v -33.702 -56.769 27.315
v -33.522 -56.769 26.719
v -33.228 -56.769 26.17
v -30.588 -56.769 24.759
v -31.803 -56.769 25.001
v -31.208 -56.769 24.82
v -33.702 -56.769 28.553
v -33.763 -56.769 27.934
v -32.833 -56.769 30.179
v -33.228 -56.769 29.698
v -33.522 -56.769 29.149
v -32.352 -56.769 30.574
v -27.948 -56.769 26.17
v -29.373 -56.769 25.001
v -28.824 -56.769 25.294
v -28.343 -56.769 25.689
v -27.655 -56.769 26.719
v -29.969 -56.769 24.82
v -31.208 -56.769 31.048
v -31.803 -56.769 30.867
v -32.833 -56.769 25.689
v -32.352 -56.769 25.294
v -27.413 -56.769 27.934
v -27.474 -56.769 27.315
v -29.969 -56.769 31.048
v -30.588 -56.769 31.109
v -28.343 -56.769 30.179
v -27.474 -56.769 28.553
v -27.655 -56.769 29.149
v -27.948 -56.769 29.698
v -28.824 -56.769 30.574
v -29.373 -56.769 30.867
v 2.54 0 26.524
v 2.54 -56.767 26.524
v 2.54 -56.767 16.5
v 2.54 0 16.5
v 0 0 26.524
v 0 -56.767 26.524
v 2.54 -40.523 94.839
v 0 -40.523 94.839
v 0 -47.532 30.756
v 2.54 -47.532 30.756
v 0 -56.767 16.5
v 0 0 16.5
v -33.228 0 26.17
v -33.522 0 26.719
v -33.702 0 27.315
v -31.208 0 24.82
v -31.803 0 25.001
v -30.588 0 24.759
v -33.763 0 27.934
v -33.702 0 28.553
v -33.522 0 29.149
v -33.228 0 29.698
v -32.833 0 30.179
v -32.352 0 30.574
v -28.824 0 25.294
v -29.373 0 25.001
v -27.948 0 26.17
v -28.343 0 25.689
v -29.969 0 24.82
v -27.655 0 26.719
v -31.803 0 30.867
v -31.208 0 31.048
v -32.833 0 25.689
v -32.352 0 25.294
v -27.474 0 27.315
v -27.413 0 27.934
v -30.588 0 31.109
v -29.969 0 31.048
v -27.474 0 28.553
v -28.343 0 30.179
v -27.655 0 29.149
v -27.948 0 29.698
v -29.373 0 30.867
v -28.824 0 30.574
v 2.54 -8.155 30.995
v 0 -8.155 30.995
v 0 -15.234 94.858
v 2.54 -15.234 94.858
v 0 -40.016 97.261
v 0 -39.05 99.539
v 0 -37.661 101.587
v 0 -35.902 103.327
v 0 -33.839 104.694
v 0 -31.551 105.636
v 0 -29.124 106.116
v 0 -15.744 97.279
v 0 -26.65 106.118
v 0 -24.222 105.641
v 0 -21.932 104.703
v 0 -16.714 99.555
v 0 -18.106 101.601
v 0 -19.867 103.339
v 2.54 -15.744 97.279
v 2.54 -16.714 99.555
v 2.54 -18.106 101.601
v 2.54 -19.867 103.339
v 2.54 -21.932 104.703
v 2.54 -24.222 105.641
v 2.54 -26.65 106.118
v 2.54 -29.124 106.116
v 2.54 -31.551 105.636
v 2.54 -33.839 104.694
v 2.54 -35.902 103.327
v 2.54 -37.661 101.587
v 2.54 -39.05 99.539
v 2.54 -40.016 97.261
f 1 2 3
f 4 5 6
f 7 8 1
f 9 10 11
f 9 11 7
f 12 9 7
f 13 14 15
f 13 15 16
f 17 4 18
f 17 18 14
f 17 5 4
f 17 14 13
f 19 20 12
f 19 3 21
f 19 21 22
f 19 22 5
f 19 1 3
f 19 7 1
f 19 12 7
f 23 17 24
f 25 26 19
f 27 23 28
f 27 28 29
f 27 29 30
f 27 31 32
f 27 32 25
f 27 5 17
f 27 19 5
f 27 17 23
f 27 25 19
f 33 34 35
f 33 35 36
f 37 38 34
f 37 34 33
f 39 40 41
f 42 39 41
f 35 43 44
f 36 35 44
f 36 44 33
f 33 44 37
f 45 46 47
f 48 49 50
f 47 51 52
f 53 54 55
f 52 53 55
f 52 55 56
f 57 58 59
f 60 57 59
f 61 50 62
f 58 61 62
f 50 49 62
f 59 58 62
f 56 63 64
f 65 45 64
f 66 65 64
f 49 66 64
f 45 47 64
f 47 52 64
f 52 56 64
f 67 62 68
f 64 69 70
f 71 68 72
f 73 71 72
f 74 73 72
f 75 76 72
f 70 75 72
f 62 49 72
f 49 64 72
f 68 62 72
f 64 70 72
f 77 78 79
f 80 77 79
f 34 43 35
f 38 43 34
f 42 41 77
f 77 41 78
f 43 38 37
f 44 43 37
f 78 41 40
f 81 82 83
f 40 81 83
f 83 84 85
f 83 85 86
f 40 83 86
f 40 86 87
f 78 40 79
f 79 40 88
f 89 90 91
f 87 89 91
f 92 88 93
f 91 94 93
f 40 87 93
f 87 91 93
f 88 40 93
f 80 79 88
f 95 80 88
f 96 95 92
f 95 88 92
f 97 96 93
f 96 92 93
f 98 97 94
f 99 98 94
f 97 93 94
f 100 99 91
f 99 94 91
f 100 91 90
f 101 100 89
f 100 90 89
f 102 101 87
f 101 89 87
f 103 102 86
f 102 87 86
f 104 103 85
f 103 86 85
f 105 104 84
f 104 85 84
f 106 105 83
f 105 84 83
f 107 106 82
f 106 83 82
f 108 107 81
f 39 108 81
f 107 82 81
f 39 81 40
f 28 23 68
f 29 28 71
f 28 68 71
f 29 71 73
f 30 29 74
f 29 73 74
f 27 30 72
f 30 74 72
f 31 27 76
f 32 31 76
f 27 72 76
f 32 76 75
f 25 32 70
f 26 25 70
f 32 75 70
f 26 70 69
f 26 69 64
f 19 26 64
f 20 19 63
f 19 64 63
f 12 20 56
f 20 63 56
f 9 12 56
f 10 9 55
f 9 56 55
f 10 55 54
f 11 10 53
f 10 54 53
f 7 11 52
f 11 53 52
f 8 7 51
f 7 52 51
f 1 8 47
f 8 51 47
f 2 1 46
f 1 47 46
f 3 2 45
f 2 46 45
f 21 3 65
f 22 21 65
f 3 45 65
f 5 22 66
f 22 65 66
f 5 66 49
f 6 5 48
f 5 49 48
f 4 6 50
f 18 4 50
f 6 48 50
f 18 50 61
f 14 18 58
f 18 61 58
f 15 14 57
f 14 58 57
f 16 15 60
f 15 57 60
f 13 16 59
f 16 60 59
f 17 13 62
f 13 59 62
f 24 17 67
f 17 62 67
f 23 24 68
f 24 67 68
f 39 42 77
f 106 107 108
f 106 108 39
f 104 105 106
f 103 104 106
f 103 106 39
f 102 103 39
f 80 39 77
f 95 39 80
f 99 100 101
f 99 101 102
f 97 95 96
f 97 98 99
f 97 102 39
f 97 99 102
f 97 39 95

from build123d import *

# Parameters (mm, degrees)
F0_R     = 3.175
F1_DEPTH = 56.769
F2_W     = 56.7667558789
F2_H     = 10.0242104381
F3_DEPTH = 2.54
F5_DEPTH = 2.54


# Not quite as in the source:
# - a feature names something its author has since deleted; it is built from what else it names


with BuildPart() as f1:
    # F0 (on Front) → F1 (new body)
    with BuildSketch(Plane.XZ):
        with Locations((-30.5883418769, 27.933979407)):
            Circle(F0_R)
    extrude(amount=F1_DEPTH)


with BuildPart() as f3:
    # F2 (on Right) → F3 (new body)
    with BuildSketch(Plane.YZ):
        with Locations((-28.3833779395, 21.5122671798)):
            Rectangle(F2_W, F2_H)
    extrude(amount=F3_DEPTH)


with BuildPart() as f5:
    # F4 (on Right) → F5 (new body)
    with BuildSketch(Plane.YZ):
        with BuildLine():
            ThreePointArc((-15.2336207801, 94.8577174533), (-15.1755603882, 94.1580515789), (-15.1561872556, 93.4562481686))
            ThreePointArc((-15.1561872556, 93.4562481686), (-28.570028053, 80.7537998705), (-40.5234116559, 94.8392511643))
            Line((-40.5234116559, 94.8392511643), (-47.5317611003, 30.7562586925))
            Line((-47.5317611003, 30.7562586925), (-8.1549498937, 30.9948429335))
            Line((-8.1549498937, 30.9948429335), (-15.2336207801, 94.8577174533))
        make_face()
        with BuildLine():
            ThreePointArc((-40.5234116559, 94.8392511643), (-28.570028053, 80.7537998705), (-15.1561872556, 93.4562481686))
            ThreePointArc((-15.1561872556, 93.4562481686), (-15.1755603882, 94.1580515789), (-15.2336207801, 94.8577174533))
            ThreePointArc((-15.2336207801, 94.8577174533), (-27.8867885653, 106.1775571463), (-40.5234116559, 94.8392511643))
        make_face()
    extrude(amount=F5_DEPTH)


solid = Compound([f1.part, f3.part, f5.part])
